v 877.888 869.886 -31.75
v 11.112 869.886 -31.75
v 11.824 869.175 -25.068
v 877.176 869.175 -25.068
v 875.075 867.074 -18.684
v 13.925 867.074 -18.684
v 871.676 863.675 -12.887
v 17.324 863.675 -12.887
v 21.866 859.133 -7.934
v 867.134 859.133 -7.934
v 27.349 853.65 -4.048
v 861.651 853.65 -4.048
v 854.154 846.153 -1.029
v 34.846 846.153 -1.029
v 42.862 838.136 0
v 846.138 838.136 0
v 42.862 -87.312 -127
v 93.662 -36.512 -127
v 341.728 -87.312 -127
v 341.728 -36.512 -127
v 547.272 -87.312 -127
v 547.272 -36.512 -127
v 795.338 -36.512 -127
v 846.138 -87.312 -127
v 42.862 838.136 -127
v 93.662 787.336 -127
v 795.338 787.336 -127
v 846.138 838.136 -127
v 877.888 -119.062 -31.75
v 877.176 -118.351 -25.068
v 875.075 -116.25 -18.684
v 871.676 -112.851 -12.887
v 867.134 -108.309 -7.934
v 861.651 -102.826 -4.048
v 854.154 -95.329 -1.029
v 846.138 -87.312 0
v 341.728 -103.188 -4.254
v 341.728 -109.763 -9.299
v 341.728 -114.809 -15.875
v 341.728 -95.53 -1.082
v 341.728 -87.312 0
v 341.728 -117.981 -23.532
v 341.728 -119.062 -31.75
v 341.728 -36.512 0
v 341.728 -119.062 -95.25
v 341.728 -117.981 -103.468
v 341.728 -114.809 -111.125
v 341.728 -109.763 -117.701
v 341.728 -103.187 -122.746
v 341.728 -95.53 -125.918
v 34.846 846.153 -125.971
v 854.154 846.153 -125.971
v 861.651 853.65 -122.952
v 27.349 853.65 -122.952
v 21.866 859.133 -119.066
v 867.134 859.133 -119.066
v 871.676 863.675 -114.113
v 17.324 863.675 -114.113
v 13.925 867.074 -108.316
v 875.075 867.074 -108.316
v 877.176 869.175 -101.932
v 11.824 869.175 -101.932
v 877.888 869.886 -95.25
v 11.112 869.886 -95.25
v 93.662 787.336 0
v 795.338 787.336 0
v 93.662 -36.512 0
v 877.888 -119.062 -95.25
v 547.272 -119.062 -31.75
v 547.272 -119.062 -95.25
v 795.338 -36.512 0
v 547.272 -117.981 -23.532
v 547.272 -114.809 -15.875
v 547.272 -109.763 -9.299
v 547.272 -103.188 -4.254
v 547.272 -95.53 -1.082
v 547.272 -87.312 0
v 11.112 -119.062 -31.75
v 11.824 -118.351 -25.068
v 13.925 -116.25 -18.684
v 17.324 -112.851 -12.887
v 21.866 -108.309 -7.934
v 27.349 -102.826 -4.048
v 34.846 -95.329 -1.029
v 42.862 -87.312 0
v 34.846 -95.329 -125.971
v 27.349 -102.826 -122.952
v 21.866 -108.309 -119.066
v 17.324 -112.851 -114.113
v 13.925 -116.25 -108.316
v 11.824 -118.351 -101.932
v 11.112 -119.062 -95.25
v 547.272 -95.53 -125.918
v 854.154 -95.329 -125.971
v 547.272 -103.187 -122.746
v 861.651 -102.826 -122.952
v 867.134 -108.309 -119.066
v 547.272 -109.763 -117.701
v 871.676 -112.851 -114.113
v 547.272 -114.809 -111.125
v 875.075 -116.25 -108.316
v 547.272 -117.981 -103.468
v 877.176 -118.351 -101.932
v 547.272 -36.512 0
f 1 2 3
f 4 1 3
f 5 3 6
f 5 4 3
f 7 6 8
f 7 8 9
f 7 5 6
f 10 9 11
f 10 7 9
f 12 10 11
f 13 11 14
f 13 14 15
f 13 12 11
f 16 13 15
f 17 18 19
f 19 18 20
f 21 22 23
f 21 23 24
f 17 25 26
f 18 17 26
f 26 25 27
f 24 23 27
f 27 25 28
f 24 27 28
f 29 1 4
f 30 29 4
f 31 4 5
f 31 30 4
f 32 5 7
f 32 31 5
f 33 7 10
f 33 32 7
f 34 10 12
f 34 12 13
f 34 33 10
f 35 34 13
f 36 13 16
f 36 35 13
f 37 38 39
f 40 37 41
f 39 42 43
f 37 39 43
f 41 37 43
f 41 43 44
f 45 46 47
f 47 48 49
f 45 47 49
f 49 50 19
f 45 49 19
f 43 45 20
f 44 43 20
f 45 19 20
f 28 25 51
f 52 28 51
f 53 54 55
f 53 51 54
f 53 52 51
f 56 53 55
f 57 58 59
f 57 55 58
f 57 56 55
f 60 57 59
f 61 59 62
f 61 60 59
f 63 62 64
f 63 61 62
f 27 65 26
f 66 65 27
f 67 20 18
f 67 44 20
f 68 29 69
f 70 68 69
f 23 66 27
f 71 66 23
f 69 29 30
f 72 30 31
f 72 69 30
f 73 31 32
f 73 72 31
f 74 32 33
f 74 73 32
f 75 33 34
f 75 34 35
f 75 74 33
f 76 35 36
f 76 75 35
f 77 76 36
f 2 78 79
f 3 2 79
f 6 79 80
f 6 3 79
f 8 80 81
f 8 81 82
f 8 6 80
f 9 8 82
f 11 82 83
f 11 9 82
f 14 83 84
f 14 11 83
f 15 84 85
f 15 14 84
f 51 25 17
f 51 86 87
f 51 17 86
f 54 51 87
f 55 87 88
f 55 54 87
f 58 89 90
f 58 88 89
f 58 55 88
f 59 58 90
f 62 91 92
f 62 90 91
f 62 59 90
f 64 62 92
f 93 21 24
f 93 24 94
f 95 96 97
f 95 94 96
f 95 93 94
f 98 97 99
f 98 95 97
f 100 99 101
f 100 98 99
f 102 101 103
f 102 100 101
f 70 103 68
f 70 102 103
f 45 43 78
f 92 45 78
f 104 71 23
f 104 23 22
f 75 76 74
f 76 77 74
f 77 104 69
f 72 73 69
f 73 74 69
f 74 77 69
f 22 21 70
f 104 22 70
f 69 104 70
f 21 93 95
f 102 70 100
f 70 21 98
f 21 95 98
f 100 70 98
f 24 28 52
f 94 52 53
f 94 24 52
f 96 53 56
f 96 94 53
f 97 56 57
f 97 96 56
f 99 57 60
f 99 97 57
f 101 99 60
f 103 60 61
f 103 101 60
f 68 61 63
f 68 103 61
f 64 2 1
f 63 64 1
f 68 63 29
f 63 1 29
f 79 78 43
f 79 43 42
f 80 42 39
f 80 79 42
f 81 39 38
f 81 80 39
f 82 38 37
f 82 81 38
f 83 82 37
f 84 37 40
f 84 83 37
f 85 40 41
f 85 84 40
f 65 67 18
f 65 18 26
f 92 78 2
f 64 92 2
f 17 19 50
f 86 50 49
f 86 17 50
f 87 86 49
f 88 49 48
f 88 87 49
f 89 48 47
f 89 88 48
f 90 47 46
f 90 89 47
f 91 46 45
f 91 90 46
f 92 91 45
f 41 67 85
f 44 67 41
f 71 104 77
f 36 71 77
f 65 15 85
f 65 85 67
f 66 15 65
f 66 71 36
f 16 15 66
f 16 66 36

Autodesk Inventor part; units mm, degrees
ref_plane "YZ Plane" through (0, 0, 0) normal (1, 0, 0) x (0, 1, 0)
ref_plane "XZ Plane" through (0, 0, 0) normal (0, 1, 0) x (-1, 0, 0)
ref_plane "XY Plane" through (0, 0, 0) normal (0, 0, 1) x (1, 0, 0)
sketch "Sketch1" plane through (0, 0, 0) normal (0, 0, 1) x (1, 0, 0)
  line L0 (787.4, -34.925) -> (547.2722, -34.925) construction
  line L1 (793.75, -30.988) -> (793.75, 781.812) construction
  line L2 (787.4, 785.749) -> (101.6, 785.749) construction
  line L3 (95.25, 781.812) -> (95.25, -30.988) construction
  line L4 (795.3375, -36.5125) -> (93.6625, -36.5125)
  line L5 (93.6625, -36.5125) -> (93.6625, 787.3365)
  line L6 (93.6625, 787.3365) -> (795.3375, 787.3365)
  line L7 (795.3375, 787.3365) -> (795.3375, -36.5125)
  line L8 (877.8875, -119.0625) -> (11.1125, -119.0625)
  line L9 (11.1125, -119.0625) -> (11.1125, 869.8865)
  line L10 (11.1125, 869.8865) -> (877.8875, 869.8865)
  line L11 (877.8875, 869.8865) -> (877.8875, -119.0625)
  point P0 (0, 0)
  dimension "d0" = 1.5875
  dimension "d1" = 1.5875
  dimension "d2" = 1.5875
  dimension "d3" = 1.5875
  dimension "d4" = 82.55
extrude "Extrusion1" add sketch "Sketch1" against normal blind 127
fillet "Fillet1" radius 31.75 8 edges at (444.5, -119.0625, -127) (444.5, -119.0625, 0) (11.1125, 375.412, 0) (11.1125, 375.412, -127) (444.5, 869.8865, -127) (444.5, 869.8865, 0) (877.8875, 375.412, -127) (877.8875, 375.412, 0)
sketch "Sketch2" plane through (0, 0, -127) normal (0, 0, -1) x (-1, 0, 0)
  line L0 (-547.2722, -247.9153) -> (-341.7278, -247.9153)
  line L1 (-341.7278, -247.9153) -> (-341.7278, 127.868)
  line L2 (-341.7278, 127.868) -> (-547.2722, 127.868)
  line L3 (-547.2722, 127.868) -> (-547.2722, -247.9153)
  line L4 (-547.2722, -34.925) -> (-548.4674, -30.988) projected
  line L5 (-341.7278, -34.925) -> (-340.5326, -30.988) projected
  point P0 (0, 0)
extrude "Extrusion2" cut sketch "Sketch2" against normal through all
equation "\"d1\" = d0"
equation "\"d2\" = d0"
equation "\"d3\" = d0"
properties part number "BumperSub"
